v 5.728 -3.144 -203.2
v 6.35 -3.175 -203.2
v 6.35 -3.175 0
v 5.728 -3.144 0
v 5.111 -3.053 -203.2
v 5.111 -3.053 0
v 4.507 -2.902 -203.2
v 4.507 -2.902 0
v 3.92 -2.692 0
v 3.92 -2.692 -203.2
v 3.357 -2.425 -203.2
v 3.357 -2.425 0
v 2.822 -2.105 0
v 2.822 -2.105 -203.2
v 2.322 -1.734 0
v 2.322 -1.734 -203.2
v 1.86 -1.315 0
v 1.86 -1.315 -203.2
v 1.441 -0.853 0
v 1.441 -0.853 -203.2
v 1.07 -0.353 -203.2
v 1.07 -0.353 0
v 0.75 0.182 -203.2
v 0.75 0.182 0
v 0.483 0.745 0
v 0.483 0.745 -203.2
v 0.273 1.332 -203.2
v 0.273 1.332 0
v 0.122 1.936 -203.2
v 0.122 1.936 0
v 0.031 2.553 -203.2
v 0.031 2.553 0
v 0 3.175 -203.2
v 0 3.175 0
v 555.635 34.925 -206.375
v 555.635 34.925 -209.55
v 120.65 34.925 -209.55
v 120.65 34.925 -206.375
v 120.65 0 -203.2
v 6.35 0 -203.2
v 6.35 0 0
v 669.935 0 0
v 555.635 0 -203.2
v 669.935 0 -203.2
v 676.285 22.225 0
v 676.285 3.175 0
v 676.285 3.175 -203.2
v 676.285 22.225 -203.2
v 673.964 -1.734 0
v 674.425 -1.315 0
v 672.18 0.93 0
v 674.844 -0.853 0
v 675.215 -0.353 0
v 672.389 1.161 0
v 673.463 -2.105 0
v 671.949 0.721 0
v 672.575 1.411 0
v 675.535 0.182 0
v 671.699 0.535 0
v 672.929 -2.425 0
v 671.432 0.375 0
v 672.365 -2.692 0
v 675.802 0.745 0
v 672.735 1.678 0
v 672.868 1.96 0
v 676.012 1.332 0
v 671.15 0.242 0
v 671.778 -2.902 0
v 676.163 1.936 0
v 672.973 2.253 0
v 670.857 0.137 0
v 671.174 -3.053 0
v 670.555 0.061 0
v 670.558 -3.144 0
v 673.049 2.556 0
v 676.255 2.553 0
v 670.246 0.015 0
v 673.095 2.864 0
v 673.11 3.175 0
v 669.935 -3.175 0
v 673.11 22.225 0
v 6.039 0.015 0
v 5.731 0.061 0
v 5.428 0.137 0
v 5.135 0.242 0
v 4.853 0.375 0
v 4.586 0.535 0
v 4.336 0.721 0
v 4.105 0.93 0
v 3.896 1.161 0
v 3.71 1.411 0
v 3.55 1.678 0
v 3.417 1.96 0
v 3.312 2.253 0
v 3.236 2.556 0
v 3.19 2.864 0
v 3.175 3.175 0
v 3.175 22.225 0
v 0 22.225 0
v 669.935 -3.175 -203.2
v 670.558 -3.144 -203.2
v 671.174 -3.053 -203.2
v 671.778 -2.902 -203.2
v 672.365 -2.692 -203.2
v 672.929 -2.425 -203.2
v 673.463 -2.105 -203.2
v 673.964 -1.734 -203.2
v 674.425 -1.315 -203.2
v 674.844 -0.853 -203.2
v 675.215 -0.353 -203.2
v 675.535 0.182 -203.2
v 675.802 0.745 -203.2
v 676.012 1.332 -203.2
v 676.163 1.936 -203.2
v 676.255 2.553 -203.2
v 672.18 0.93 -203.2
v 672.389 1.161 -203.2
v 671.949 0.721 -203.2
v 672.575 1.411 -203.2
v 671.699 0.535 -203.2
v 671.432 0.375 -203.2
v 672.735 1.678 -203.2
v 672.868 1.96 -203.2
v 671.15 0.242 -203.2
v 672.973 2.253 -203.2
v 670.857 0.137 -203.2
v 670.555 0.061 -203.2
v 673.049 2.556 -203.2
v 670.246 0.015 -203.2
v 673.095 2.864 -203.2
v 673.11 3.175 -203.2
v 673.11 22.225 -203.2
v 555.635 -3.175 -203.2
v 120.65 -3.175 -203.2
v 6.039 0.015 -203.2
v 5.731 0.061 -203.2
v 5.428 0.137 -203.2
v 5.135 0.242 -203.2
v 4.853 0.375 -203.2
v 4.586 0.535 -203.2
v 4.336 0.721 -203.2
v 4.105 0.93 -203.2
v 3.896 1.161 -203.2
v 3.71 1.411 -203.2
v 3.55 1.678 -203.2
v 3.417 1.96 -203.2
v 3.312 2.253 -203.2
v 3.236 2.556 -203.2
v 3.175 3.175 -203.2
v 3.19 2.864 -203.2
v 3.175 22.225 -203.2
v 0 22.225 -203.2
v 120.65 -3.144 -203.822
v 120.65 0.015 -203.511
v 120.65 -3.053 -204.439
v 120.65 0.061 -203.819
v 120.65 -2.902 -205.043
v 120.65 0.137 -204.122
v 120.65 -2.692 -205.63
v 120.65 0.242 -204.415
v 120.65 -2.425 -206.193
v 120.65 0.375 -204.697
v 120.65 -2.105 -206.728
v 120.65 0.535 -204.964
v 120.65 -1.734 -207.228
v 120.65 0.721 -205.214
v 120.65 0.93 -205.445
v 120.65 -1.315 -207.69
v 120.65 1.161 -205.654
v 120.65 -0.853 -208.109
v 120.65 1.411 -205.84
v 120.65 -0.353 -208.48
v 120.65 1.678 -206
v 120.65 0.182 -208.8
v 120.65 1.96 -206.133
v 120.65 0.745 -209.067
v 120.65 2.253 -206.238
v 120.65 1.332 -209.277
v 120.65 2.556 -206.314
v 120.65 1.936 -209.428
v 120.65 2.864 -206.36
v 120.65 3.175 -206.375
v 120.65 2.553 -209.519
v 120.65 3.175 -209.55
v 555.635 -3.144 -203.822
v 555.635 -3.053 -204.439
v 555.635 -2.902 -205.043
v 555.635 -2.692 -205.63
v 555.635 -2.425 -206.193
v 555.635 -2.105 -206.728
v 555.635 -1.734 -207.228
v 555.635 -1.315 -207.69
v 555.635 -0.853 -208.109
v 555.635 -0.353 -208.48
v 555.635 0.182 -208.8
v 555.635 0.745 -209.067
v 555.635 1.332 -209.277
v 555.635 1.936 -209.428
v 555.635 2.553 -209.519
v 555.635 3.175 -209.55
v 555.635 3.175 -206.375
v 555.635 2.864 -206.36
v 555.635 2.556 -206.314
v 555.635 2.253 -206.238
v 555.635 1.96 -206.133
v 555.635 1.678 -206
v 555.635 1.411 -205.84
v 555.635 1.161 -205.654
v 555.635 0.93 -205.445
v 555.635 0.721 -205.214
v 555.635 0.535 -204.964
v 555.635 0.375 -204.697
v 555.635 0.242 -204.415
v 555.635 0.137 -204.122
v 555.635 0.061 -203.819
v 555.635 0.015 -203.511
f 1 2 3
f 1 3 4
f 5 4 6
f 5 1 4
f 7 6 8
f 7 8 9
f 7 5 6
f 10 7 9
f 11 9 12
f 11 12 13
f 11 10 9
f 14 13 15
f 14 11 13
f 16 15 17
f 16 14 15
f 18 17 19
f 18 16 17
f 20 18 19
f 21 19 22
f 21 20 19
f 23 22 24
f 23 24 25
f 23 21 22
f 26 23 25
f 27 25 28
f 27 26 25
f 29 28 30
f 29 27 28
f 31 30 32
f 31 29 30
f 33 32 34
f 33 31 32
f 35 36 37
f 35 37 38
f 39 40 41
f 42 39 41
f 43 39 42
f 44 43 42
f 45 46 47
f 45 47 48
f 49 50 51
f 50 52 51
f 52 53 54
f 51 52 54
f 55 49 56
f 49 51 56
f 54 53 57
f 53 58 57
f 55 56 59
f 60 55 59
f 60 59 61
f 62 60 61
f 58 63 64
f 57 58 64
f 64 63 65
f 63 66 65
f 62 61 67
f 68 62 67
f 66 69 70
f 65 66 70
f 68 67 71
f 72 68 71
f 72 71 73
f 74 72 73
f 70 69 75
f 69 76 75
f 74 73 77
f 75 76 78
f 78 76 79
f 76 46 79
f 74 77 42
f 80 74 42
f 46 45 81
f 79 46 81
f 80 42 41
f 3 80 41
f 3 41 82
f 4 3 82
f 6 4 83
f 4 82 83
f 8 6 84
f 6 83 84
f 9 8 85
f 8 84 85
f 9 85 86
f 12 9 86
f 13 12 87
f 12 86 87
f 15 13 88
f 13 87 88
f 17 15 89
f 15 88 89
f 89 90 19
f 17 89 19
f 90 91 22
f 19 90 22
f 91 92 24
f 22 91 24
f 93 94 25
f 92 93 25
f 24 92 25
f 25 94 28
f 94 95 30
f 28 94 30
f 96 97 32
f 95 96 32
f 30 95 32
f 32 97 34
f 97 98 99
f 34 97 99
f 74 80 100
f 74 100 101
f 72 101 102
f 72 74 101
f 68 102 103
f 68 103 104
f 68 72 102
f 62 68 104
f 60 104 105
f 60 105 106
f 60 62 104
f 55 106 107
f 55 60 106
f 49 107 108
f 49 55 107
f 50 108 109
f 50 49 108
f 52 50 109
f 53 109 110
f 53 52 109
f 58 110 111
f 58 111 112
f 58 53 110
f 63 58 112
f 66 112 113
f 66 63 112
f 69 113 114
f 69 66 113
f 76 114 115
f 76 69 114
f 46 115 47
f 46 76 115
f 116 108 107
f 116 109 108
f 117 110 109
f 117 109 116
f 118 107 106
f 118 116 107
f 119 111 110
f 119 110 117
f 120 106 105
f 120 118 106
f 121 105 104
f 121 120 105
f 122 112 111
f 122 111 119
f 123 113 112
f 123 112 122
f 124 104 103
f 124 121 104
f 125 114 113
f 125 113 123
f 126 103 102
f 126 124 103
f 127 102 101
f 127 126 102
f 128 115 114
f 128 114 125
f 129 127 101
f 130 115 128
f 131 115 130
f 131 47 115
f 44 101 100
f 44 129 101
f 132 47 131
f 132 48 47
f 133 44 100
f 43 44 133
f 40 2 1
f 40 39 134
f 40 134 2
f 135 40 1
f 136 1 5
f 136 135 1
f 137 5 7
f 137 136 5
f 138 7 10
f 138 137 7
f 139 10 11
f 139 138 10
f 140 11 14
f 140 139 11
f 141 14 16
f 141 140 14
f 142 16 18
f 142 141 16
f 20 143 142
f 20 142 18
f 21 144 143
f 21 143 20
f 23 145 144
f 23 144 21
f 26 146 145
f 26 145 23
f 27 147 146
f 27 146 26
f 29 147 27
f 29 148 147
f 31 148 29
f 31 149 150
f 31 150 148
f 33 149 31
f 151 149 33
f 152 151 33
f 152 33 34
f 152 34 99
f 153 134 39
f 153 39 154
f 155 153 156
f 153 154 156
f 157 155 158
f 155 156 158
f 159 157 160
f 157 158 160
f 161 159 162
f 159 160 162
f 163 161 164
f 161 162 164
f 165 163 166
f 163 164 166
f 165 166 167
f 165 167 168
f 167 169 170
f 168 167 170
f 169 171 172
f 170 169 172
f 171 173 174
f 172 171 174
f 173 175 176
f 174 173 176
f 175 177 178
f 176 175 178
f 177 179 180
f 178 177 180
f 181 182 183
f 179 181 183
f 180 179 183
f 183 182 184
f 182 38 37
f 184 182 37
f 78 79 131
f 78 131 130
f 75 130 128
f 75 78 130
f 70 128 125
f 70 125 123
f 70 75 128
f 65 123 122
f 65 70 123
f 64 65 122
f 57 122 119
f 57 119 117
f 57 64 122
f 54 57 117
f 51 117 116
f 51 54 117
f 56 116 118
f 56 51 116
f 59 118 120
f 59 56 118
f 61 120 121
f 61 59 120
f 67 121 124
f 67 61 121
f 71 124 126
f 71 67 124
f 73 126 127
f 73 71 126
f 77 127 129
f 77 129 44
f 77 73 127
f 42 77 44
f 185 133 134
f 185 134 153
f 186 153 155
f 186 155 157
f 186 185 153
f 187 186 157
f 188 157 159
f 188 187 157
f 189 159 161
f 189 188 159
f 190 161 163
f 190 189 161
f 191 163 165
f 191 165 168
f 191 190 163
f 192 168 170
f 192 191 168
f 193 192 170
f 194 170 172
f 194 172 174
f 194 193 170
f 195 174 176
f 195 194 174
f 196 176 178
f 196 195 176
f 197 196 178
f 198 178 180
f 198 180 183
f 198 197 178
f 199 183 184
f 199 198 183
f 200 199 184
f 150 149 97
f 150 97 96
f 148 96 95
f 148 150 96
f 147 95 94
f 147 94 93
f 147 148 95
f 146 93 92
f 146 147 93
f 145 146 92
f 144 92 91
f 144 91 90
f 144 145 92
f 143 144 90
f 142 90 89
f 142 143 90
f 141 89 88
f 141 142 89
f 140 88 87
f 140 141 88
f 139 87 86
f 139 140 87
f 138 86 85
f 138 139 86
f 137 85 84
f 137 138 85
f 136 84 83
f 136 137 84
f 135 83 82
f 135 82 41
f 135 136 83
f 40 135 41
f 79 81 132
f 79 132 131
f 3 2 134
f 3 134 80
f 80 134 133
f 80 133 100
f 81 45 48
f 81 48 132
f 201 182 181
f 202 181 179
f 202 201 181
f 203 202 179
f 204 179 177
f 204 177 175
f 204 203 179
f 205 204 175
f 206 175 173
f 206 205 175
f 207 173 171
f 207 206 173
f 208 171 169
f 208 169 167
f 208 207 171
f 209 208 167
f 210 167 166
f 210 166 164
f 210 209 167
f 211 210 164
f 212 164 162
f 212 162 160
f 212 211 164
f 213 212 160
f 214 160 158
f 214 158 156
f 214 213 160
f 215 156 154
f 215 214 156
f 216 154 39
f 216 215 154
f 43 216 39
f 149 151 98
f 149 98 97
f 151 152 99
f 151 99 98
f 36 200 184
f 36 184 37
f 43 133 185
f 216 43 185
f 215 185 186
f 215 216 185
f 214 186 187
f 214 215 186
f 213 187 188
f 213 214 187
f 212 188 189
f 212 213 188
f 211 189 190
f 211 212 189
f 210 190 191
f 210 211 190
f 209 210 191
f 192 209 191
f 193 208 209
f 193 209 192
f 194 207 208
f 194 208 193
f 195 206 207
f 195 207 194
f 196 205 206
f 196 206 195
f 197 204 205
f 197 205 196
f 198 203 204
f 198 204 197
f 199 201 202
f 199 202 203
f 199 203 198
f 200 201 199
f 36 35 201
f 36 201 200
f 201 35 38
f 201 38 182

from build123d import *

# Parameters (mm, degrees)
SKETCH1_W                      = 676.28516
SKETCH1_H                      = 203.2
BASE_FLANGE1_DEPTH             = 3.175
EDGE_FLANGE2_STRIP_W           = 19.05
EDGE_FLANGE2_STRIP_H           = 3.175
EDGE_FLANGE2_STRIP_CUT_DEPTH   = 203.2
EDGE_FLANGE2_STRIP_2_W         = 19.05
EDGE_FLANGE2_STRIP_2_H         = 3.175
EDGE_FLANGE2_STRIP_CUT_2_DEPTH = 203.2
EDGE_FLANGE2_DEPTH             = 203.2
EDGE_FLANGE2_BEND_DEPTH        = 203.2
EDGE_FLANGE3_DEPTH             = 434.98516


# Sheet-metal steps are written as plain solids
with BuildPart() as part:
    # Sketch1 → Base-Flange1 (new body)
    with BuildSketch(Plane(origin=(0, 0, 0), x_dir=(1, 0, 0), z_dir=(0, 1, 0))):
        with Locations((338.14258, 101.6)):
            Rectangle(SKETCH1_W, SKETCH1_H)
    extrude(amount=-BASE_FLANGE1_DEPTH)

    # Edge-Flange2 strip (across the edge) → Edge-Flange2 strip cut (cut)
    with BuildSketch(Plane(origin=(676.28516, 0, 0), x_dir=(-1, 0, 0), z_dir=(0, 0, -1))):
        with Locations((-3.175, -1.5875)):
            Rectangle(EDGE_FLANGE2_STRIP_W, EDGE_FLANGE2_STRIP_H)
    extrude(amount=EDGE_FLANGE2_STRIP_CUT_DEPTH, mode=Mode.SUBTRACT)

    # Edge-Flange2 strip 2 (across the edge) → Edge-Flange2 strip cut 2 (cut)
    with BuildSketch(Plane.XY.offset(-203.2)):
        with Locations((-3.175, -1.5875)):
            Rectangle(EDGE_FLANGE2_STRIP_2_W, EDGE_FLANGE2_STRIP_2_H)
    extrude(amount=EDGE_FLANGE2_STRIP_CUT_2_DEPTH, mode=Mode.SUBTRACT)

    # Edge-Flange2 section (across the edge) → Edge-Flange2 (add)
    with BuildSketch(Plane(origin=(676.28516, 0, 0), x_dir=(-1, 0, 0), z_dir=(0, 0, -1))):
        with BuildLine():
            Line((0, 3.175), (0, 22.225))
            Line((0, 22.225), (3.175, 22.225))
            Line((3.175, 22.225), (3.175, 3.175))
            ThreePointArc((3.175, 3.175), (4.10493597, 0.92993597), (6.35, 0))
            Line((6.35, 0), (6.35, -3.175))
            ThreePointArc((6.35, -3.175), (1.859871939, -1.315128061), (0, 3.175))
        make_face()
    extrude(amount=EDGE_FLANGE2_DEPTH)

    # Edge-Flange2 section 2 (across the edge) → Edge-Flange2 bend (add)
    with BuildSketch(Plane.XY.offset(-203.2)):
        with BuildLine():
            Line((0, 3.175), (0, 22.225))
            Line((0, 22.225), (3.175, 22.225))
            Line((3.175, 22.225), (3.175, 3.175))
            ThreePointArc((3.175, 3.175), (4.10493597, 0.92993597), (6.35, 0))
            Line((6.35, 0), (6.35, -3.175))
            ThreePointArc((6.35, -3.175), (1.859871939, -1.315128061), (0, 3.175))
        make_face()
    extrude(amount=EDGE_FLANGE2_BEND_DEPTH)

    # Edge-Flange3 section (across the edge) → Edge-Flange3 (add)
    with BuildSketch(Plane(origin=(555.63516, 0, -206.375), x_dir=(0, 0, 1), z_dir=(-1, 0, 0))):
        with BuildLine():
            Line((-3.175, 3.175), (-3.175, 34.925))
            Line((-3.175, 34.925), (0, 34.925))
            Line((0, 34.925), (0, 3.175))
            ThreePointArc((0, 3.175), (0.92993597, 0.92993597), (3.175, 0))
            Line((3.175, 0), (3.175, -3.175))
            ThreePointArc((3.175, -3.175), (-1.315128061, -1.315128061), (-3.175, 3.175))
        make_face()
    extrude(amount=EDGE_FLANGE3_DEPTH)


solid = part.part
